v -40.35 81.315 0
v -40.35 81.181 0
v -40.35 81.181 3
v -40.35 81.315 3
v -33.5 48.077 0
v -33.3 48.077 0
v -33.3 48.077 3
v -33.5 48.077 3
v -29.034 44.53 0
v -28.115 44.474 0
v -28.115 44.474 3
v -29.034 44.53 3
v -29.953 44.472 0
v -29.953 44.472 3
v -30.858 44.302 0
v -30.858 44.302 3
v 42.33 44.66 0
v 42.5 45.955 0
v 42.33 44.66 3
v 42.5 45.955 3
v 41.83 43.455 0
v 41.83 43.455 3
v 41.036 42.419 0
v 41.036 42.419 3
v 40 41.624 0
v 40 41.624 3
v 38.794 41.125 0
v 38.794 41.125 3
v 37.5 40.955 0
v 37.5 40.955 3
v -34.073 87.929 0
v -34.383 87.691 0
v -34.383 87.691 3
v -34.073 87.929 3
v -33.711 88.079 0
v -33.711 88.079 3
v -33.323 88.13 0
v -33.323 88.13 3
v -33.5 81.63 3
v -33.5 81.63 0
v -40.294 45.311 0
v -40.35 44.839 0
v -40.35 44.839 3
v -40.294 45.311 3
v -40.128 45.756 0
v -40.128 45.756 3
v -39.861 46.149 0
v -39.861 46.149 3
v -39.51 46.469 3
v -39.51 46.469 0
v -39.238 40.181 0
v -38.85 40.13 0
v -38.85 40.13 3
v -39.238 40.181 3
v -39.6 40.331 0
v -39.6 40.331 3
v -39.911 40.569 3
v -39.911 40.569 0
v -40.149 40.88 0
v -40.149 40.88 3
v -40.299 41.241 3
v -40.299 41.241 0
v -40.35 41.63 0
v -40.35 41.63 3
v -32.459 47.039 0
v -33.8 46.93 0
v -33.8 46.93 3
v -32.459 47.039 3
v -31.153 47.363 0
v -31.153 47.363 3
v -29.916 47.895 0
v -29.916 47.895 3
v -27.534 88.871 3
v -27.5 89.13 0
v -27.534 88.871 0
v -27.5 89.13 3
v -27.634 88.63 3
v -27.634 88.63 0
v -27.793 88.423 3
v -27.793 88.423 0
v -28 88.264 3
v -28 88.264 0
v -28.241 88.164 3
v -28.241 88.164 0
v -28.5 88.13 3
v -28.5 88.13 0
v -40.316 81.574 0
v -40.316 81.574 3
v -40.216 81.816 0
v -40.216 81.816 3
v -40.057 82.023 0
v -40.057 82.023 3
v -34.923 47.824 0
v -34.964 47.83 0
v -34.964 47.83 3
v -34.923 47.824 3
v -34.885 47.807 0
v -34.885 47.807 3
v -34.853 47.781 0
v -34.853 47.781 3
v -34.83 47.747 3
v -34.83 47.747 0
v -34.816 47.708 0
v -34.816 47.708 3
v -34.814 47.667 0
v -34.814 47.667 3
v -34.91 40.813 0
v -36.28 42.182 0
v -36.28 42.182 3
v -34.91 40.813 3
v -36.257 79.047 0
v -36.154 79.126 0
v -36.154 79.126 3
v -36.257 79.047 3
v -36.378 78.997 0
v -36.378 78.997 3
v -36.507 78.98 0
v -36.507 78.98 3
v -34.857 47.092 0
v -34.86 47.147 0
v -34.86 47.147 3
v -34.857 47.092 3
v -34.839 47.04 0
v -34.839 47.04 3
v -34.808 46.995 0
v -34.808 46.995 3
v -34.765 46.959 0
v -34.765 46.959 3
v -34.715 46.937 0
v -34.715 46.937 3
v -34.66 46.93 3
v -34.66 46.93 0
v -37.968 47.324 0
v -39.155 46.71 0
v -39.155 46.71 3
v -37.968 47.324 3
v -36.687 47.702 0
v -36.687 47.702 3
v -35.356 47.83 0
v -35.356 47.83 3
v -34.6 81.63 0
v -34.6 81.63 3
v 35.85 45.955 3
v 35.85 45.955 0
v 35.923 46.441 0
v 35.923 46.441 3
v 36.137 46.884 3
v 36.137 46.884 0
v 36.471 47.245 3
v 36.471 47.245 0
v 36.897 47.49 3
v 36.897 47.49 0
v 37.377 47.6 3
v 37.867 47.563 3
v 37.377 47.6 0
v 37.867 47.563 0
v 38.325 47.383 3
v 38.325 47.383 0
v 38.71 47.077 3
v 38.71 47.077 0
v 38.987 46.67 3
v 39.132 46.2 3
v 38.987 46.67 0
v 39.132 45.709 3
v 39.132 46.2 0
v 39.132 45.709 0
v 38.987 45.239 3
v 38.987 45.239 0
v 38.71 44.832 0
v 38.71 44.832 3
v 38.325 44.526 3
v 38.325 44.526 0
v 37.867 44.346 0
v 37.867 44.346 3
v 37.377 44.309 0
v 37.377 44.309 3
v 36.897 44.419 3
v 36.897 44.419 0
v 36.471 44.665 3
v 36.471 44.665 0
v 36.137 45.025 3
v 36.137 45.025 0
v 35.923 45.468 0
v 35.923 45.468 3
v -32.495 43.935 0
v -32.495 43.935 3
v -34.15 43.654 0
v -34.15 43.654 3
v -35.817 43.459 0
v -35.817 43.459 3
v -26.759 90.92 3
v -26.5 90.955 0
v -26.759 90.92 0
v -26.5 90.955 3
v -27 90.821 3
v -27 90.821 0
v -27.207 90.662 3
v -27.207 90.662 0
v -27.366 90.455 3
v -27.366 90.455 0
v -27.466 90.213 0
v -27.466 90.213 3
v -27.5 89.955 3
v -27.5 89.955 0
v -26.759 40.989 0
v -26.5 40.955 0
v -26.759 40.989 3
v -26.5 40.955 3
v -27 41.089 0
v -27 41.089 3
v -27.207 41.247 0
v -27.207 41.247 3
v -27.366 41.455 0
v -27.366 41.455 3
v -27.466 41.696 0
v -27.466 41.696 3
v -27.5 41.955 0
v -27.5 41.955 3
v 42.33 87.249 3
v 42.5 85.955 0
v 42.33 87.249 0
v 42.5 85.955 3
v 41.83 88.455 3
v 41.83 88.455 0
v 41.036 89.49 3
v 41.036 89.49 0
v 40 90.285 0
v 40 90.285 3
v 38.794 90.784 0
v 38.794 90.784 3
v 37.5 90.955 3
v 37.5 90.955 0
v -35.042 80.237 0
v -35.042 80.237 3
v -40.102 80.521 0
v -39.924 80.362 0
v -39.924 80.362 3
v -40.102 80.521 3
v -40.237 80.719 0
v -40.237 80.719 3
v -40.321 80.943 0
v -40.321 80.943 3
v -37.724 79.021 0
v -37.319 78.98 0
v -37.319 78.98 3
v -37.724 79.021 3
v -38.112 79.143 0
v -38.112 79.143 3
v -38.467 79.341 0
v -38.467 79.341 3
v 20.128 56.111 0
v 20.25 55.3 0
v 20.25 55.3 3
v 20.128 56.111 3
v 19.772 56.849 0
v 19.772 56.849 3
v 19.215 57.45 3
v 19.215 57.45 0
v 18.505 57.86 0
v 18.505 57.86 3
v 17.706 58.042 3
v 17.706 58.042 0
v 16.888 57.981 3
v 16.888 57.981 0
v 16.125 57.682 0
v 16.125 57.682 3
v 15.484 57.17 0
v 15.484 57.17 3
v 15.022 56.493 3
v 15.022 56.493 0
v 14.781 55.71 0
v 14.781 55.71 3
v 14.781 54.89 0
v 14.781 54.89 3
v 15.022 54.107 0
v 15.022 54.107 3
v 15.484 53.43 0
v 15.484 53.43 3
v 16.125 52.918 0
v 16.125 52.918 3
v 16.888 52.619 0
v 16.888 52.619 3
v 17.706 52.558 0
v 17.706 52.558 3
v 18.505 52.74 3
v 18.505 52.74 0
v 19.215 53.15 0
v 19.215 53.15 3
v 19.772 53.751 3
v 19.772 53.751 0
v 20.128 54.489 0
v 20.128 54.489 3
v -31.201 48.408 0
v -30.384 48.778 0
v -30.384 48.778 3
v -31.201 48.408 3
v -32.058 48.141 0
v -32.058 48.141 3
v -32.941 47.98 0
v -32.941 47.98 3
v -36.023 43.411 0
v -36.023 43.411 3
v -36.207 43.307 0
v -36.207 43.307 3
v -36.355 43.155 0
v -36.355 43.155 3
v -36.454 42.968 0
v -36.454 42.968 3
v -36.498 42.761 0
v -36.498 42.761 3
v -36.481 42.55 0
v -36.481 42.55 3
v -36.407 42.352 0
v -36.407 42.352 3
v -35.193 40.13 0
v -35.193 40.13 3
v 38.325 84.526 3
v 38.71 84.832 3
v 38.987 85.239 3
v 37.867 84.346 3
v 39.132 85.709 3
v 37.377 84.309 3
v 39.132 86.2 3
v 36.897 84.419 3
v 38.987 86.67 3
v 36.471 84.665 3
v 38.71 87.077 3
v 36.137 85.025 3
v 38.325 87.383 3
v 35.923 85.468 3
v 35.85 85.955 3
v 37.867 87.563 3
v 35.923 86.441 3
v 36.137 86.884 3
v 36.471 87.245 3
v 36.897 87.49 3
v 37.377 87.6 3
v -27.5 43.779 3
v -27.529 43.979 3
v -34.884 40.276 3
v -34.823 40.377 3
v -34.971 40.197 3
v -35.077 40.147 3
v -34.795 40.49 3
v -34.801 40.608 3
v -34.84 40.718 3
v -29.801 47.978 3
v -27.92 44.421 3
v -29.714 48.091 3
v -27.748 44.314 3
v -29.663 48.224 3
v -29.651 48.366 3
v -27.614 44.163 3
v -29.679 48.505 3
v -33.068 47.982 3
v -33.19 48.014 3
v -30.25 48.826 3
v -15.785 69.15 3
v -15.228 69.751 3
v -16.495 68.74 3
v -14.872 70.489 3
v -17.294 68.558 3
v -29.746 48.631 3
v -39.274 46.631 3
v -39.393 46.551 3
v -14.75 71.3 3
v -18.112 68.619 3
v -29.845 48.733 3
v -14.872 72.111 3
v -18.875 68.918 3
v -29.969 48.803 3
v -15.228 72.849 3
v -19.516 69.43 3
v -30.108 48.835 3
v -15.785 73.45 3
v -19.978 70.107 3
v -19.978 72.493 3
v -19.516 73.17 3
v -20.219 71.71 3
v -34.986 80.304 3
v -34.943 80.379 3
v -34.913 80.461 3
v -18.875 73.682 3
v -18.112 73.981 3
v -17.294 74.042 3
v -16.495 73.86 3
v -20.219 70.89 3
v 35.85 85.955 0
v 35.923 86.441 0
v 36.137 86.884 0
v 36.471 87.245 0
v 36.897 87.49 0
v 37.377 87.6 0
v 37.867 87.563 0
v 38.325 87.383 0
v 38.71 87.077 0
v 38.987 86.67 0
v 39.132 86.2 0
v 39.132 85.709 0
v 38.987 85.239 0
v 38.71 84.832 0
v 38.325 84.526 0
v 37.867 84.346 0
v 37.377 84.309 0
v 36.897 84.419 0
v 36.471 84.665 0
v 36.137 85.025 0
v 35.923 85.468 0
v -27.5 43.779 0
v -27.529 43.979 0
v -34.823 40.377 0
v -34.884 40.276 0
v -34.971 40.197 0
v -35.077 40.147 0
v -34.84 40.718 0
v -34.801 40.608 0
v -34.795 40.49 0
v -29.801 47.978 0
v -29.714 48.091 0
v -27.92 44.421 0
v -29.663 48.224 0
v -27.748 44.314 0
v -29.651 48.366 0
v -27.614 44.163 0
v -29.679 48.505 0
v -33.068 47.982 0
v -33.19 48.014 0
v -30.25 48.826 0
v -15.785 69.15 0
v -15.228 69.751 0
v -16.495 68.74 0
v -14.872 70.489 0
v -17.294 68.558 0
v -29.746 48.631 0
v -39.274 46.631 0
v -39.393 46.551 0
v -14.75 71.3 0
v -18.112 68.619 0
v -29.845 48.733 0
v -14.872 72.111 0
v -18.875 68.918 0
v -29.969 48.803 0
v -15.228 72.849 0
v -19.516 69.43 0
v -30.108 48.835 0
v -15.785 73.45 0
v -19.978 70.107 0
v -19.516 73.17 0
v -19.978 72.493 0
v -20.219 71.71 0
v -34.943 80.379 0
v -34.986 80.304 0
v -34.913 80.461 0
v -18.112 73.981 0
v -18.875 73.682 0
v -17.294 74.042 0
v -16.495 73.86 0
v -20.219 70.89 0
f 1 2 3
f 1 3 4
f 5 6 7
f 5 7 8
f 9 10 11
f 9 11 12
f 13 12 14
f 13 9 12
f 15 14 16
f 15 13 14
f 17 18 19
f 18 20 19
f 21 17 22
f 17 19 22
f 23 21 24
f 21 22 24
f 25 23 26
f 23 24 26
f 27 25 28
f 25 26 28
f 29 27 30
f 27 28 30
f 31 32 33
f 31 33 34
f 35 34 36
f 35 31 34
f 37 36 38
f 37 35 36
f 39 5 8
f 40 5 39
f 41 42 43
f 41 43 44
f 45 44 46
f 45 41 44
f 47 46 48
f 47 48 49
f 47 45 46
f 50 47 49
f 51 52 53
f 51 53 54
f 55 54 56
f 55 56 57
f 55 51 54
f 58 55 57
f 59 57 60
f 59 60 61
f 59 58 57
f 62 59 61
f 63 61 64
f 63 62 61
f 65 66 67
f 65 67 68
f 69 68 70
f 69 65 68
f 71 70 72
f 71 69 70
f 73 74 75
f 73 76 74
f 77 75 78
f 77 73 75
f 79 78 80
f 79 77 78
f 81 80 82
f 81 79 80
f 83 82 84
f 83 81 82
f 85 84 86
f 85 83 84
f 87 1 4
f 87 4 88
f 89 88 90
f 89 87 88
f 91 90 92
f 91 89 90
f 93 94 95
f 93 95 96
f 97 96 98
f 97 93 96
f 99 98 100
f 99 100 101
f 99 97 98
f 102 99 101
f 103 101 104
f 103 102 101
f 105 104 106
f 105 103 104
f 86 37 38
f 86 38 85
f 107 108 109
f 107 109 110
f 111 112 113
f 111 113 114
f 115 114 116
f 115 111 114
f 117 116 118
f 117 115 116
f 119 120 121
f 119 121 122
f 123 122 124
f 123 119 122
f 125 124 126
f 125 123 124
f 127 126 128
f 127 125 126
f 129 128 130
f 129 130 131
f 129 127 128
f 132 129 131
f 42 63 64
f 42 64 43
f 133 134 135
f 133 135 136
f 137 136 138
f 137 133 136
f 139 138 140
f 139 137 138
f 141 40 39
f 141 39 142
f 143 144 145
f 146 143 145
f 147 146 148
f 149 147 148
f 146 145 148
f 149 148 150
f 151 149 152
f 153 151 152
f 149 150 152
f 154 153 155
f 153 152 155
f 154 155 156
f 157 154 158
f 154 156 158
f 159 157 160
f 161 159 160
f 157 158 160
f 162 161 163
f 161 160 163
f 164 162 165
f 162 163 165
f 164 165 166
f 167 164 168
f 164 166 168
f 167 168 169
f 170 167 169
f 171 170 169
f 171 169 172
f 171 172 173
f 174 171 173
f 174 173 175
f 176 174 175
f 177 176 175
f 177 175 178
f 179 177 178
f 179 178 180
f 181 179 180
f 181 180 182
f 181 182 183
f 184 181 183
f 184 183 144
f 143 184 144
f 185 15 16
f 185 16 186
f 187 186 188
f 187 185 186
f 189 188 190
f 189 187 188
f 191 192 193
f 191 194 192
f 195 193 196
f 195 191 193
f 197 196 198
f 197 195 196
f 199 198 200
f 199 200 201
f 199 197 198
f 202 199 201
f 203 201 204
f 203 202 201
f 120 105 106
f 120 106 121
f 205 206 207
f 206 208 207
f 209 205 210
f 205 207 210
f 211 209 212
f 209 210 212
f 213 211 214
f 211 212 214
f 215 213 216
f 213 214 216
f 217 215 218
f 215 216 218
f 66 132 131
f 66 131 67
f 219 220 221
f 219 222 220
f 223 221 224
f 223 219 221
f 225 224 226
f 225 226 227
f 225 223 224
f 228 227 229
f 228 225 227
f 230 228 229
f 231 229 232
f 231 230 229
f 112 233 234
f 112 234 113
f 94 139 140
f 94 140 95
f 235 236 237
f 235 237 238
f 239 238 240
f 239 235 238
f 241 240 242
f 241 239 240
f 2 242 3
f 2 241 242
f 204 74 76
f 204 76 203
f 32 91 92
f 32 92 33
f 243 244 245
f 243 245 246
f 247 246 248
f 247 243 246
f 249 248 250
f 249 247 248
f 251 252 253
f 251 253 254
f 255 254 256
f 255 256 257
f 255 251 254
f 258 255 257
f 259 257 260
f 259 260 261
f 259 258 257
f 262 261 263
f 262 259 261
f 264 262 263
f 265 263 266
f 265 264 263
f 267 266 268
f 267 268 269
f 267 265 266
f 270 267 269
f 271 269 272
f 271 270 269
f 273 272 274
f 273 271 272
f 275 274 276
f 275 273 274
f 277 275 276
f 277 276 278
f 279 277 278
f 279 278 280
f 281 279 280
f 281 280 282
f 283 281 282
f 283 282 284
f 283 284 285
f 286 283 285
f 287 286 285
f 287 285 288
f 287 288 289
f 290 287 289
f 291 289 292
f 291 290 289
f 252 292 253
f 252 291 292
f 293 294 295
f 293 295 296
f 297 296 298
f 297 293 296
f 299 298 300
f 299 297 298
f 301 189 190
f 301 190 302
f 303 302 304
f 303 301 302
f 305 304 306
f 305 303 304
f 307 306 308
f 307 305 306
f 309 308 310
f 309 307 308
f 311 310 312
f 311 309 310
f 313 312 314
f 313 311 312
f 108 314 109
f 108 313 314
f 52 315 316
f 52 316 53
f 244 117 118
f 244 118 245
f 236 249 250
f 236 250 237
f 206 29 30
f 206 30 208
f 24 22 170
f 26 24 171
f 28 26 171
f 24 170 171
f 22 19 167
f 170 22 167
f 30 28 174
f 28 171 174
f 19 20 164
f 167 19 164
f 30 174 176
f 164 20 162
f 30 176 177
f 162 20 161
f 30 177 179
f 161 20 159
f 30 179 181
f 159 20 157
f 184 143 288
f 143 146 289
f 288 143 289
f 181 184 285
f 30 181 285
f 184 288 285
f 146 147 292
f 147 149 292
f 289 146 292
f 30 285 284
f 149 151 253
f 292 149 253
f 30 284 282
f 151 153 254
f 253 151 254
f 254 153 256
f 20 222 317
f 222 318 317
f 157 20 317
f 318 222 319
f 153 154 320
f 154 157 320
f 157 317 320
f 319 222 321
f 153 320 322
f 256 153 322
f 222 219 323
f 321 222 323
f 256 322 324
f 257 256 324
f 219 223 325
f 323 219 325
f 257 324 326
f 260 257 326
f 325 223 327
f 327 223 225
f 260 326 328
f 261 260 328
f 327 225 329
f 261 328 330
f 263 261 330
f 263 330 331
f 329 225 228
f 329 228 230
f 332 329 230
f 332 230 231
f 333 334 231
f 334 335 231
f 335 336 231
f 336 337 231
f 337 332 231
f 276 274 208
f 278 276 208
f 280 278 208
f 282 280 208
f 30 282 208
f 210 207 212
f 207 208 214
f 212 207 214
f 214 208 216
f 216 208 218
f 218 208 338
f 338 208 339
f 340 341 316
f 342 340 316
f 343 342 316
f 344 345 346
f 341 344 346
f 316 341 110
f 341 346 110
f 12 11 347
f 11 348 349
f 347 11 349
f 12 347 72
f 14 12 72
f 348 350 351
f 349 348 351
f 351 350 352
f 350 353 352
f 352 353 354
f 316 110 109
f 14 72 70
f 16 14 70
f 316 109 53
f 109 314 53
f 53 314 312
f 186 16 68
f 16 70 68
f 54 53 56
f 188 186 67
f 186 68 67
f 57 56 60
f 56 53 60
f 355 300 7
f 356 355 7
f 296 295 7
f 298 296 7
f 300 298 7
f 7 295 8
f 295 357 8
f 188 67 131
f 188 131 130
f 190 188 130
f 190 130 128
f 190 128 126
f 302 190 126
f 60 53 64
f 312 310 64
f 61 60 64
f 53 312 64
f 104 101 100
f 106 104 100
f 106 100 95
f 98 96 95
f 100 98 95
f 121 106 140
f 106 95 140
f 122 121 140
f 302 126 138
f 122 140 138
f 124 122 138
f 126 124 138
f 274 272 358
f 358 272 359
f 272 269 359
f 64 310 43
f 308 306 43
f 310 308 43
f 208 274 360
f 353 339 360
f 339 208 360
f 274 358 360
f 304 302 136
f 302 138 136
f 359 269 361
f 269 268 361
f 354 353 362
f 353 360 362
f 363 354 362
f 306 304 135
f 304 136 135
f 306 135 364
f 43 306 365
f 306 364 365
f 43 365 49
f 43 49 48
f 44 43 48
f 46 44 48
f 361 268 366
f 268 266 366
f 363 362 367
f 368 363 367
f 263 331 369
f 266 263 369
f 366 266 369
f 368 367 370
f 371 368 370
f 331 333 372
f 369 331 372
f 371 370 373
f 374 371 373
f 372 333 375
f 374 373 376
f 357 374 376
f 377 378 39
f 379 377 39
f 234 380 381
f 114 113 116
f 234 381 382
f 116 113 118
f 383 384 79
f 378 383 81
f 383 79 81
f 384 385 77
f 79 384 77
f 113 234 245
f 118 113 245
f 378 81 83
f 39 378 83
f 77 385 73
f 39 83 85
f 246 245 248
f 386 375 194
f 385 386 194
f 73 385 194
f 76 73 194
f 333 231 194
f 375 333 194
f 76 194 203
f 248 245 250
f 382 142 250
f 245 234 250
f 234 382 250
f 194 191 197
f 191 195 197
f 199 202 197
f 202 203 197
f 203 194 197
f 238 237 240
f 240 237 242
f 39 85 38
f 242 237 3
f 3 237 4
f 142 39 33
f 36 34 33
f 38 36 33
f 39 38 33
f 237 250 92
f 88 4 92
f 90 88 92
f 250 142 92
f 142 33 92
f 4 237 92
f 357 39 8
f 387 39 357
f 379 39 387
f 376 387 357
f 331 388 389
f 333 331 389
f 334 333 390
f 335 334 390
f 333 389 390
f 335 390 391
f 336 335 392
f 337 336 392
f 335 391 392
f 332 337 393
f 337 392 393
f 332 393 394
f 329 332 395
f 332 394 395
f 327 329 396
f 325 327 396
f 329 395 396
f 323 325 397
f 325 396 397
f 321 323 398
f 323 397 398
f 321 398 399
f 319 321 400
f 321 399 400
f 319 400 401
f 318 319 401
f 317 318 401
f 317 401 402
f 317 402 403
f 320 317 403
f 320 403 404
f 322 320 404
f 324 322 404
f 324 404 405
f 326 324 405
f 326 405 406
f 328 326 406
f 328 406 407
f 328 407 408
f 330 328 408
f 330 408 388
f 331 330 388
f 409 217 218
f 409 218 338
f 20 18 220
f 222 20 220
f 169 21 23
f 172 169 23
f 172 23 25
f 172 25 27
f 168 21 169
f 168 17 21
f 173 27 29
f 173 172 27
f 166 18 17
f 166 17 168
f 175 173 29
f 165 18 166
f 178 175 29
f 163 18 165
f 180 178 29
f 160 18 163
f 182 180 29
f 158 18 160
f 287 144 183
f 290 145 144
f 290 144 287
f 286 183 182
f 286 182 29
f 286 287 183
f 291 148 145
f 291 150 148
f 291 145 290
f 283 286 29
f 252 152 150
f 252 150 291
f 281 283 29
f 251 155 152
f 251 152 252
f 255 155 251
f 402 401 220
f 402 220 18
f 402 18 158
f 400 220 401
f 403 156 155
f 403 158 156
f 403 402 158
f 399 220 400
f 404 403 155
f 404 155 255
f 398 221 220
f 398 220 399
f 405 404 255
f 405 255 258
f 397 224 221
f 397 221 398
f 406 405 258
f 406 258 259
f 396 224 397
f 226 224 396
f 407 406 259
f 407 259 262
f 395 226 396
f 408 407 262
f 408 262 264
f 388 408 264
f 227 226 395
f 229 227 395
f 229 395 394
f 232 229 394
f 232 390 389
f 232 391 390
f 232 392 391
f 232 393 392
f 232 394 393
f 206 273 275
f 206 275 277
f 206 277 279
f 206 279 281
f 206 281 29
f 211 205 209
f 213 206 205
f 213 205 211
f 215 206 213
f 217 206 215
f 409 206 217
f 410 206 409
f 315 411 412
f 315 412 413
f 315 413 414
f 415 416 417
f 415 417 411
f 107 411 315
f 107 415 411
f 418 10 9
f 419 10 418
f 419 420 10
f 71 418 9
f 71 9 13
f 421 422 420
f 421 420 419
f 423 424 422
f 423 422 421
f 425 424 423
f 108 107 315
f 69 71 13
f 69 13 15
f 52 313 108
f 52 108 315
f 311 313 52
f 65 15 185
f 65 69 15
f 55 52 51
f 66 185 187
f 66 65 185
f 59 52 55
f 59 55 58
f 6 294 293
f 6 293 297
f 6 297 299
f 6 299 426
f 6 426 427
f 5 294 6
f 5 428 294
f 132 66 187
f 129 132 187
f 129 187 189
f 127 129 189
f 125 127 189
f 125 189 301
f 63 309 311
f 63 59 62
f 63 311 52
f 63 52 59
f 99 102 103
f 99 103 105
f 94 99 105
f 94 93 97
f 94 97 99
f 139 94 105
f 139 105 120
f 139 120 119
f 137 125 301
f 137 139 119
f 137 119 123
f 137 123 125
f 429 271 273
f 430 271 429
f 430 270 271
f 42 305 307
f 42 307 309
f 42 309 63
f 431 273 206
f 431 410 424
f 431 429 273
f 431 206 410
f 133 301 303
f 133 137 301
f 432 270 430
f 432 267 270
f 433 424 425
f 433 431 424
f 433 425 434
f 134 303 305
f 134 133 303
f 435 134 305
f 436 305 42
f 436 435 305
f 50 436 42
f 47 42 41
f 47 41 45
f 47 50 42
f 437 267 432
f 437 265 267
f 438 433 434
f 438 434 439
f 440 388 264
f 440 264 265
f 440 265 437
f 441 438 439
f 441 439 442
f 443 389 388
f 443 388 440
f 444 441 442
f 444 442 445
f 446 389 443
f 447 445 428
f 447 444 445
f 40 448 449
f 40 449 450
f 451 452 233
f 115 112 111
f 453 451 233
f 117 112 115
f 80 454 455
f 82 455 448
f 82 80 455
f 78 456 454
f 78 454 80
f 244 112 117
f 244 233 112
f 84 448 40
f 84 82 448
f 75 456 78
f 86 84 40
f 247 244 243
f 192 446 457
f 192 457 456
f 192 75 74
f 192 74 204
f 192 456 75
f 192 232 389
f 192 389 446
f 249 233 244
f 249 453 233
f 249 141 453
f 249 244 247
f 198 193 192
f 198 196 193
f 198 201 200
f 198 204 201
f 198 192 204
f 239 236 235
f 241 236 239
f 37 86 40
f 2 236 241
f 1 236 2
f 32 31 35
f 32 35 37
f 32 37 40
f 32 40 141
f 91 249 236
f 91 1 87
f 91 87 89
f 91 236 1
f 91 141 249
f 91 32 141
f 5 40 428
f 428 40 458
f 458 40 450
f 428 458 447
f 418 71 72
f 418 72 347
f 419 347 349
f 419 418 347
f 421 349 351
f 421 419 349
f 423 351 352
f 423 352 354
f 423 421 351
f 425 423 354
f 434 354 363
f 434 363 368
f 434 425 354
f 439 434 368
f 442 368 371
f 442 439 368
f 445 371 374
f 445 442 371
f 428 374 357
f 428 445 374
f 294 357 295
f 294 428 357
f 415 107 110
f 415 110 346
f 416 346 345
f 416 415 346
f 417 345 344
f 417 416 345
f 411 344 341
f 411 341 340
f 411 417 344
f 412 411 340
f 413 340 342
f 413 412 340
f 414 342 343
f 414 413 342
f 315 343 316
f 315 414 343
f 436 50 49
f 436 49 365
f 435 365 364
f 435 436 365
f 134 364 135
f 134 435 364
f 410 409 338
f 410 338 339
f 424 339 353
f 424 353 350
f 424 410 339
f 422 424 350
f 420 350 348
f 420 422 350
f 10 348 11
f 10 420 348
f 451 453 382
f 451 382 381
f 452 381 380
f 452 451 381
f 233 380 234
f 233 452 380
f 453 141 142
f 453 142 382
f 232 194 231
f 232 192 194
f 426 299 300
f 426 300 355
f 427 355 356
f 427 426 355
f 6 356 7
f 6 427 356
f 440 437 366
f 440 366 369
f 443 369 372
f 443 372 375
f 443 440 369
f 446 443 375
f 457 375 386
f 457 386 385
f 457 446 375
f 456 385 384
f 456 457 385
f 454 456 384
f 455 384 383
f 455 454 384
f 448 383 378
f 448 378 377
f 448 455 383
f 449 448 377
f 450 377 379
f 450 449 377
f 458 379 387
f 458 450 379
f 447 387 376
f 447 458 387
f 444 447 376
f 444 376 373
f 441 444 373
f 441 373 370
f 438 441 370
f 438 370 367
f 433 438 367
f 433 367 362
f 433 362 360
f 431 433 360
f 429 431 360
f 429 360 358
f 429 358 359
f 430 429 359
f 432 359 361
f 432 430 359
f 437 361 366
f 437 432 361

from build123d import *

# Parameters (mm, degrees)
SKETCH1_R                       = 2.75
BOSS_EXTRUDE1_DEPTH             = 3
BOSS_EXTRUDE2_START             = -3
SKETCH2_W                       = 70
SKETCH2_H                       = 50
SKETCH2_R                       = 2.75
BOSS_EXTRUDE2_DEPTH             = 3
FILLET1_R                       = 5
TAP_DRILL_FOR_M4X0_7_TAP1_D     = 3.3
TAP_DRILL_FOR_M4X0_7_TAP1_DEPTH = 5
TAP_DRILL_FOR_M4X0_7_TAP1_TIP   = 0.991420021
FILLET2_R                       = 1


with BuildPart() as part:
    # Sketch1 → Boss-Extrude1 (new body)
    with BuildSketch(Plane.XY):
        with BuildLine():
            Line((-27.5, 40.954554701), (-27.5, 43.77942119))
            ThreePointArc((-27.5, 43.77942119), (-27.675848554, 44.243388065), (-28.115043604, 44.474246643))
            ThreePointArc((-28.115043604, 44.474246643), (-29.494269709, 44.515011098), (-30.857622009, 44.302415486))
            ThreePointArc((-30.857622009, 44.302415486), (-33.320623763, 43.783640888), (-35.816700763, 43.459442898))
            ThreePointArc((-35.816700763, 43.459442898), (-36.454446159, 42.968046035), (-36.279664044, 42.182144463))
            Line((-36.279664044, 42.182144463), (-34.910050506, 40.812530925))
            ThreePointArc((-34.910050506, 40.812530925), (-34.823341406, 40.37661484), (-35.192893219, 40.129688213))
            Line((-35.192893219, 40.129688213), (-38.85, 40.129688213))
            ThreePointArc((-38.85, 40.129688213), (-39.910660172, 40.569028041), (-40.35, 41.629688213))
            Line((-40.35, 41.629688213), (-40.35, 44.839311769))
            ThreePointArc((-40.35, 44.839311769), (-40.127638883, 45.755826908), (-39.51, 46.468544718))
            ThreePointArc((-39.51, 46.468544718), (-39.333648382, 46.591125418), (-39.154570787, 46.709688213))
            ThreePointArc((-39.154570787, 46.709688213), (-37.336364984, 47.543852346), (-35.356465997, 47.829688213))
            Line((-35.356465997, 47.829688213), (-34.963696275, 47.829688213))
            ThreePointArc((-34.963696275, 47.829688213), (-34.853104675, 47.781026744), (-34.81426707, 47.666614851))
            Line((-34.81426707, 47.666614851), (-34.859717037, 47.147119361))
            ThreePointArc((-34.859717037, 47.147119361), (-34.807933564, 46.994570171), (-34.660478097, 46.929688213))
            Line((-34.660478097, 46.929688213), (-33.8, 46.929688213))
            ThreePointArc((-33.8, 46.929688213), (-31.798990845, 47.174505883), (-29.916025641, 47.89451656))
            ThreePointArc((-29.916025641, 47.89451656), (-29.70812219, 48.570368729), (-30.383974359, 48.778272181))
            ThreePointArc((-30.383974359, 48.778272181), (-31.625663196, 48.261025539), (-32.941176471, 47.980383271))
            ThreePointArc((-32.941176471, 47.980383271), (-33.129888119, 47.994076587), (-33.3, 48.076911006))
            Line((-33.3, 48.076911006), (-33.5, 48.076911006))
            Line((-33.5, 48.076911006), (-33.5, 81.629688213))
            Line((-33.5, 81.629688213), (-34.6, 81.629688213))
            Line((-34.6, 81.629688213), (-34.913048957, 80.461373602))
            ThreePointArc((-34.913048957, 80.461373602), (-34.962999168, 80.340783124), (-35.042458479, 80.237229734))
            Line((-35.042458479, 80.237229734), (-36.153553391, 79.126134822))
            ThreePointArc((-36.153553391, 79.126134822), (-36.315765065, 79.017748447), (-36.507106781, 78.979688213))
            Line((-36.507106781, 78.979688213), (-37.319402422, 78.979688213))
            ThreePointArc((-37.319402422, 78.979688213), (-37.920814021, 79.072254311), (-38.466555295, 79.341384124))
            Line((-38.466555295, 79.341384124), (-39.923576436, 80.361601311))
            ThreePointArc((-39.923576436, 80.361601311), (-40.237010833, 80.719004742), (-40.35, 81.180753355))
            Line((-40.35, 81.180753355), (-40.35, 81.315474651))
            ThreePointArc((-40.35, 81.315474651), (-40.273784436, 81.698387585), (-40.05675537, 82.022932669))
            Line((-40.05675537, 82.022932669), (-34.383177792, 87.69087524))
            ThreePointArc((-34.383177792, 87.69087524), (-33.896725598, 88.01565007), (-33.323044738, 88.129688213))
            Line((-33.323044738, 88.129688213), (-27.5, 88.129688213))
            Line((-27.5, 88.129688213), (-27.5, 90.954554701))
            Line((-27.5, 90.954554701), (22.5, 90.954554701))
            Line((22.5, 90.954554701), (22.5, 40.954554701))
            Line((22.5, 40.954554701), (-27.5, 40.954554701))
        make_face()
        with Locations((-17.5, 71.3)):
            Circle(SKETCH1_R, mode=Mode.SUBTRACT)
        with Locations((17.5, 55.3)):
            Circle(SKETCH1_R, mode=Mode.SUBTRACT)
    extrude(amount=BOSS_EXTRUDE1_DEPTH)

    # Sketch2 → Boss-Extrude2 (add)
    with BuildSketch(Plane.XY.offset(3).offset(BOSS_EXTRUDE2_START)):
        with Locations((7.5, 65.954554701)):
            Rectangle(SKETCH2_W, SKETCH2_H)
        with Locations((-17.5, 71.3)):
            Circle(SKETCH2_R, mode=Mode.SUBTRACT)
        with Locations((17.5, 55.3)):
            Circle(SKETCH2_R, mode=Mode.SUBTRACT)
    extrude(amount=BOSS_EXTRUDE2_DEPTH)

    # Fillet1
    fillet1_edges = [part.edges().sort_by_distance(p)[0] for p in [
        (42.5, 40.954554701, 1.5),
        (42.5, 90.954554701, 1.5),
    ]]
    fillet(fillet1_edges, radius=FILLET1_R)

    # Tap Drill for M4x0.7 Tap1
    with Locations(Plane.XY.offset(3)):
        with Locations((37.5, 45.954554701), (37.5, 85.954554701)):
            Hole(TAP_DRILL_FOR_M4X0_7_TAP1_D / 2, depth=TAP_DRILL_FOR_M4X0_7_TAP1_DEPTH)
            with Locations((0, 0, -(TAP_DRILL_FOR_M4X0_7_TAP1_DEPTH + TAP_DRILL_FOR_M4X0_7_TAP1_TIP / 2))):  # 118° drill point
                Cone(0, TAP_DRILL_FOR_M4X0_7_TAP1_D / 2, TAP_DRILL_FOR_M4X0_7_TAP1_TIP, mode=Mode.SUBTRACT)

    # Fillet2
    fillet2_edges = [part.edges().sort_by_distance(p)[0] for p in [
        (-27.5, 90.954554701, 1.5),
        (-27.5, 40.954554701, 1.5),
        (-27.5, 88.129688213, 1.5),
    ]]
    fillet(fillet2_edges, radius=FILLET2_R)


solid = part.part
